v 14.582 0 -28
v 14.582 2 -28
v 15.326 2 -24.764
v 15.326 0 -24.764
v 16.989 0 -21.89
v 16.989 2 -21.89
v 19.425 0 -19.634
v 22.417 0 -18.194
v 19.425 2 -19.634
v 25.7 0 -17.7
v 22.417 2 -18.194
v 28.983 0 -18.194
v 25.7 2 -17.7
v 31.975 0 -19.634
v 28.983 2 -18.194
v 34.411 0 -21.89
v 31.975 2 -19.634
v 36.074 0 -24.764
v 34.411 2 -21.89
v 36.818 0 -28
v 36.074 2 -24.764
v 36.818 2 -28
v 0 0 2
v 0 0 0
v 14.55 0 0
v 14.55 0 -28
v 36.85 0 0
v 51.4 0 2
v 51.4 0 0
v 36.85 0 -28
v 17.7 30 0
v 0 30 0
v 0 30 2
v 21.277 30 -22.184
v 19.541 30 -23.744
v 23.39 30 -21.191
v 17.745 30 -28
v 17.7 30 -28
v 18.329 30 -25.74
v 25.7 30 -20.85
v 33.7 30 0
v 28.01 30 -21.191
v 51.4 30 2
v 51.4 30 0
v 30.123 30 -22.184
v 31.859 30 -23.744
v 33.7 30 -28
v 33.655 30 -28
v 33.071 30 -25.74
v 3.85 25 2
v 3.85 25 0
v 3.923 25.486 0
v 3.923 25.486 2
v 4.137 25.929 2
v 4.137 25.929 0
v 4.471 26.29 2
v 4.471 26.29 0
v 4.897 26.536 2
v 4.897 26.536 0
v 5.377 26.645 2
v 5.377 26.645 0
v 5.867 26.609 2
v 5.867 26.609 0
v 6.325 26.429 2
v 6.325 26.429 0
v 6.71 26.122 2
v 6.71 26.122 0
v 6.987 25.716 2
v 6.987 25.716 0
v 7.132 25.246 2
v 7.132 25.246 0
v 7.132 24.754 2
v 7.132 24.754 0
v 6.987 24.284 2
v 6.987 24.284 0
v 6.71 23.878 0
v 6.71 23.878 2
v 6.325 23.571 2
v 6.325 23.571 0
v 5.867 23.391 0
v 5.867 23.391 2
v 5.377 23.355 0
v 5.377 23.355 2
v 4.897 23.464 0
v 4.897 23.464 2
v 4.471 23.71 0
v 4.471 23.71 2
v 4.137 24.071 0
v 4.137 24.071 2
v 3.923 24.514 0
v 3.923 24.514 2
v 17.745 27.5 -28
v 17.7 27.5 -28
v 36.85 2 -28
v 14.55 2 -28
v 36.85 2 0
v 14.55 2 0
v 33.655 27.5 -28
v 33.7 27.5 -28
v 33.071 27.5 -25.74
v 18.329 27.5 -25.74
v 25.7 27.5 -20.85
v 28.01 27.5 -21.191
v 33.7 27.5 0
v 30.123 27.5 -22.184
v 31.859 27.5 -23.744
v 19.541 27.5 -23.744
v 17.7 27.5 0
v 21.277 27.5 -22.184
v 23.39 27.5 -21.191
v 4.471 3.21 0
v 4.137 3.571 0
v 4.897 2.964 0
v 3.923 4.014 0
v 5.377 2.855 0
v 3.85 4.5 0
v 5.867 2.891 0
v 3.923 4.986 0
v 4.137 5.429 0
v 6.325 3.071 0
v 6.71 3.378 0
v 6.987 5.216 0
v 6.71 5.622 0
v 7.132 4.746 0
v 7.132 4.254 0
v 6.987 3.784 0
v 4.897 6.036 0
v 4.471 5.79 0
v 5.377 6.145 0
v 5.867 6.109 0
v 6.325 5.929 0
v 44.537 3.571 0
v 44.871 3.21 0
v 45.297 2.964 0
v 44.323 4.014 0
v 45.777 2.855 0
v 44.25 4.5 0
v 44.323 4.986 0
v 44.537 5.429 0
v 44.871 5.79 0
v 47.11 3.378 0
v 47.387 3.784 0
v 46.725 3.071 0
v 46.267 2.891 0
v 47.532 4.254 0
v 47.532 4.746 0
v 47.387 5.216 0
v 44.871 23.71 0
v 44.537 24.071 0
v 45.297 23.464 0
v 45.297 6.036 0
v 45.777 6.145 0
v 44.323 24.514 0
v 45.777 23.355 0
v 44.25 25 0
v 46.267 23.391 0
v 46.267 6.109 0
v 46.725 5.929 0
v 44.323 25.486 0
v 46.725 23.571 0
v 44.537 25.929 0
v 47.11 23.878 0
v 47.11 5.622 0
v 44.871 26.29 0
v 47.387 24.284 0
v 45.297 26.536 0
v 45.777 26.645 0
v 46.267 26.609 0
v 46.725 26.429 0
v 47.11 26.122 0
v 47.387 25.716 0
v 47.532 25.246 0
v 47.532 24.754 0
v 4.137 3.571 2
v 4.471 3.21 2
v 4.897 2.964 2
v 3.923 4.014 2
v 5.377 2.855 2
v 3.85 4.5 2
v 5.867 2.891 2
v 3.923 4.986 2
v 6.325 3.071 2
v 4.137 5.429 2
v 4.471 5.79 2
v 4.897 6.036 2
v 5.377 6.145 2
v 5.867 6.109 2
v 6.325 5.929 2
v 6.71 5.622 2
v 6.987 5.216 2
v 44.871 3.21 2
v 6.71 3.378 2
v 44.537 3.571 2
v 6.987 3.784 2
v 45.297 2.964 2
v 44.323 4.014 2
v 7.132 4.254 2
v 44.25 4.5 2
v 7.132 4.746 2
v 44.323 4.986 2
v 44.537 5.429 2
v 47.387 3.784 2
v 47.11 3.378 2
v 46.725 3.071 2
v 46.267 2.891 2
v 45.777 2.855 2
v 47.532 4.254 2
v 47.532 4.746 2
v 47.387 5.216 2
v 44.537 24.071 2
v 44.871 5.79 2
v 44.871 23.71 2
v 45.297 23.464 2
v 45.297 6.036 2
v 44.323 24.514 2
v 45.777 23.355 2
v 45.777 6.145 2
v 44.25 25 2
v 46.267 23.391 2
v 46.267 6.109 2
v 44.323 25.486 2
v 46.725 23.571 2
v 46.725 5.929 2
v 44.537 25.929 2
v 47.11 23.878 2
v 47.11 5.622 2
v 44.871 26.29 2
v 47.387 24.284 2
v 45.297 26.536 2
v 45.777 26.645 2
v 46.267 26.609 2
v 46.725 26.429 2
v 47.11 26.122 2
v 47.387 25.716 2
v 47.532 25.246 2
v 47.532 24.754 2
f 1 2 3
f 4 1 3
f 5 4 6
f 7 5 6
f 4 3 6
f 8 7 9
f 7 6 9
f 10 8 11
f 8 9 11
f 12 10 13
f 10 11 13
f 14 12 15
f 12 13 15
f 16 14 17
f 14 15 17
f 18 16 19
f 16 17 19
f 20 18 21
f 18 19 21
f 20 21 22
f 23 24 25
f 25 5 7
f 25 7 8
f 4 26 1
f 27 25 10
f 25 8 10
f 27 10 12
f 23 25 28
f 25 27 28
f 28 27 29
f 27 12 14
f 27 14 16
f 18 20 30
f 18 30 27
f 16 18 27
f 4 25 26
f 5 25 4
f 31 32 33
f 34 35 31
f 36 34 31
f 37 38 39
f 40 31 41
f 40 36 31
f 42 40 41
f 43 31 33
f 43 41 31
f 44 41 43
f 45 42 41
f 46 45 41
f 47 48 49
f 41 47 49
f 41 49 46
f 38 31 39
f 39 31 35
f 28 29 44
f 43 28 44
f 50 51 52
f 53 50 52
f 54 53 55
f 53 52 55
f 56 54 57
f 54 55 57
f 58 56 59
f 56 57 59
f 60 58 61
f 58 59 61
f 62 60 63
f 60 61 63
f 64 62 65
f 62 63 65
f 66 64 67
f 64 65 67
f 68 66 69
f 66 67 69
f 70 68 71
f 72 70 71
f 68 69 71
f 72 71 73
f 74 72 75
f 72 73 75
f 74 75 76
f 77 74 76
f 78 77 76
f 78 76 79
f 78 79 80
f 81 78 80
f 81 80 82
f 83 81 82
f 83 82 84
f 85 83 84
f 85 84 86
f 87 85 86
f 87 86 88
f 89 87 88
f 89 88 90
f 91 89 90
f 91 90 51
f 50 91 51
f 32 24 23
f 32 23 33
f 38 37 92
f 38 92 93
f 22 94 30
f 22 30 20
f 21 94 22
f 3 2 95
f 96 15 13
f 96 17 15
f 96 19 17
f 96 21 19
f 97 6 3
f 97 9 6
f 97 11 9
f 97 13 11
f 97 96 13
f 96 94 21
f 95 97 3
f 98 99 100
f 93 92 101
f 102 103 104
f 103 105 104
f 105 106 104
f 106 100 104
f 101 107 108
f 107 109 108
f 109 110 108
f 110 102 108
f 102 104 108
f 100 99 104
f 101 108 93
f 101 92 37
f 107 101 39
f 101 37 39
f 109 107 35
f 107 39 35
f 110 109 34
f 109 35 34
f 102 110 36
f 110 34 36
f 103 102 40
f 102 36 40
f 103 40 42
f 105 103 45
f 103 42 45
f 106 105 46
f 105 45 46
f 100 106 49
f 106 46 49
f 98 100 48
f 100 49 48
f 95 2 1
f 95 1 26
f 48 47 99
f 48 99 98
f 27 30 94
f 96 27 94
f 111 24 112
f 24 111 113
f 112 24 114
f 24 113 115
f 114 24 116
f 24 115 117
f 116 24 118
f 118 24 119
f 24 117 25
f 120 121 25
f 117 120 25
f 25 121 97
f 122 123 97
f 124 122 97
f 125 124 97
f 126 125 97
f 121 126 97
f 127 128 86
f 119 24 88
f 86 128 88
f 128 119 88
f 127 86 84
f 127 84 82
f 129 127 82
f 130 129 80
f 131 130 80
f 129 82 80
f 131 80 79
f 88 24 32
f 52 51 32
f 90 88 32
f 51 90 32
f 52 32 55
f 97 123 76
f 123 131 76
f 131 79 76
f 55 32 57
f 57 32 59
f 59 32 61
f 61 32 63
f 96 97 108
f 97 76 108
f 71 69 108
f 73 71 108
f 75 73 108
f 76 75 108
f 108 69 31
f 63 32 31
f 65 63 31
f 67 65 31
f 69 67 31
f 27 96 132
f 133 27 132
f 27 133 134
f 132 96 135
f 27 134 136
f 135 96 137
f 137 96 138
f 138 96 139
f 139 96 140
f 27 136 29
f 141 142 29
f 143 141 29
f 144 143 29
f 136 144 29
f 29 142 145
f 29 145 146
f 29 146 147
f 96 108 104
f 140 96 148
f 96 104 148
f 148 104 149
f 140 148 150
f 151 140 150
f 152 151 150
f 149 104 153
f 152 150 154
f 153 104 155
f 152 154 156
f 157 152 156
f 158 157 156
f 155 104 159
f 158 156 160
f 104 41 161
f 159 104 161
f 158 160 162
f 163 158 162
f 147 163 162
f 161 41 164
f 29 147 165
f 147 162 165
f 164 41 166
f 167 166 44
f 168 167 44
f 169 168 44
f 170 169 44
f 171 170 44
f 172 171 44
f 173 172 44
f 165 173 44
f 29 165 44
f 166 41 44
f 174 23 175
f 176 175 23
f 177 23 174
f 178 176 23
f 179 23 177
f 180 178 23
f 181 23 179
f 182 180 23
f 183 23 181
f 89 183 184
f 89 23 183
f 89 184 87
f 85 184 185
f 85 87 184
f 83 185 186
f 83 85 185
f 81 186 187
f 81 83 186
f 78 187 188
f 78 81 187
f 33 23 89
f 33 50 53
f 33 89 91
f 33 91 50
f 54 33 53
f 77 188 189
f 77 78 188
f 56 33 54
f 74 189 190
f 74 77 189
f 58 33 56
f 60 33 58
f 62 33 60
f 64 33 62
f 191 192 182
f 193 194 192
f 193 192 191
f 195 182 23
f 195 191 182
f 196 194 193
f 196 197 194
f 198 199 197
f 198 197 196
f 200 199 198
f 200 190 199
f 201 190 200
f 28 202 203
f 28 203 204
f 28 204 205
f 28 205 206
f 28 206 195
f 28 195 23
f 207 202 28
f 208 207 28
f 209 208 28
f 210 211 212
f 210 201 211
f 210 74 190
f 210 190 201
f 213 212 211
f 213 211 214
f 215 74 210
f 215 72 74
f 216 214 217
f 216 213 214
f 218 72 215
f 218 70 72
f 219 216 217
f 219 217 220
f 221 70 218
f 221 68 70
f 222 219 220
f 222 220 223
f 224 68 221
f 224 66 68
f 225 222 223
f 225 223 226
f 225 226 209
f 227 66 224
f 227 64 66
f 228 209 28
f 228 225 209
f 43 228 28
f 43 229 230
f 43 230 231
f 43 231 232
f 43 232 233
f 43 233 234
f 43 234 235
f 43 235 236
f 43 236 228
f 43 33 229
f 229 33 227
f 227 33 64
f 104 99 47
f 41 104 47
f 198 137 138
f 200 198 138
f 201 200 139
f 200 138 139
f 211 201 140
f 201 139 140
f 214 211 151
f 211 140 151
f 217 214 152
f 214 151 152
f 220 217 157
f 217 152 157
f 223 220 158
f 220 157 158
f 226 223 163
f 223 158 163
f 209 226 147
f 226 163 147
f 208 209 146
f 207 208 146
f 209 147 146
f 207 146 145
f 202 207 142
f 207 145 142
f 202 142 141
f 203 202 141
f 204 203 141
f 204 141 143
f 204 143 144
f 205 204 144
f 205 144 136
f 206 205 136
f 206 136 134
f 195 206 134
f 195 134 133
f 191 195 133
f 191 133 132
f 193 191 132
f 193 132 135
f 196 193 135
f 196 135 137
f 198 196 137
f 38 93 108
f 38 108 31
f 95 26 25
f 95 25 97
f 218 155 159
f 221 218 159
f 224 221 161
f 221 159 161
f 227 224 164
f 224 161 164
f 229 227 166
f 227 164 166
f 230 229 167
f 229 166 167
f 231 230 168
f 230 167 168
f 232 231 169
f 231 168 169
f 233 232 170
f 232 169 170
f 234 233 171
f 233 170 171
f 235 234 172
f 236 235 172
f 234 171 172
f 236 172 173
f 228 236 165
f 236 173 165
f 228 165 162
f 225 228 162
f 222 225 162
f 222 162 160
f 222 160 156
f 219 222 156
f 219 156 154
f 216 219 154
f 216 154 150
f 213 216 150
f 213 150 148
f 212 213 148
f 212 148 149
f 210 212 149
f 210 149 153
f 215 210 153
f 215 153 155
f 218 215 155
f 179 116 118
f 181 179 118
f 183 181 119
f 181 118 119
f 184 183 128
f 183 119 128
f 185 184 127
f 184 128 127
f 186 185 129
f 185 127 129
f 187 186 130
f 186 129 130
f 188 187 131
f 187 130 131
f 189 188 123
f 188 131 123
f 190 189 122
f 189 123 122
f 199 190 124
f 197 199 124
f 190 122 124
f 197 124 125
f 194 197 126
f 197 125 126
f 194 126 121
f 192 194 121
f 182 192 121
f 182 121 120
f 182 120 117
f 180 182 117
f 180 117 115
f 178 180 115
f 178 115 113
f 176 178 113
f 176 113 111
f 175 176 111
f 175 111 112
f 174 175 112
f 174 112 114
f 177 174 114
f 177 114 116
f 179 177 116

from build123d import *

# Parameters (mm, degrees)
SKETCH1_W           = 51.4
SKETCH1_H           = 30
BOSS_EXTRUDE1_DEPTH = 2
SKETCH2_R           = 1.65
CUT_EXTRUDE1_DEPTH  = 15
SKETCH3_W           = 16
SKETCH3_H           = 2.5
SKETCH3_W_2         = 22.3
SKETCH3_H_2         = 2
BOSS_EXTRUDE2_DEPTH = 28
SKETCH4_R           = 8
CUT_EXTRUDE3_DEPTH  = 10
SKETCH6_R           = 11.15
CUT_EXTRUDE4_DEPTH  = 10


with BuildPart() as part:
    # Sketch1 → Boss-Extrude1 (new body)
    with BuildSketch(Plane.XY):
        with Locations((25.7, 15)):
            Rectangle(SKETCH1_W, SKETCH1_H)
    extrude(amount=BOSS_EXTRUDE1_DEPTH)

    # Sketch2 → Cut-Extrude1 (cut)
    with BuildSketch(Plane(origin=(0, 0, 0), x_dir=(-1, 0, 0), z_dir=(0, 0, -1))):
        with Locations((-45.9, 25)):
            Circle(SKETCH2_R)
        with Locations((-5.5, 25)):
            Circle(SKETCH2_R)
        with Locations((-5.5, 4.5)):
            Circle(SKETCH2_R)
        with Locations((-45.9, 4.5)):
            Circle(SKETCH2_R)
    extrude(amount=-CUT_EXTRUDE1_DEPTH, mode=Mode.SUBTRACT)

    # Sketch3 → Boss-Extrude2 (add)
    with BuildSketch(Plane(origin=(0, 0, 0), x_dir=(-1, 0, 0), z_dir=(0, 0, -1))):
        with Locations((-25.7, 28.75)):
            Rectangle(SKETCH3_W, SKETCH3_H)
        with Locations((-25.7, 1)):
            Rectangle(SKETCH3_W_2, SKETCH3_H_2)
    extrude(amount=BOSS_EXTRUDE2_DEPTH)

    # Sketch4 → Cut-Extrude3 (cut)
    with BuildSketch(Plane(origin=(0, 30, 0), x_dir=(1, 0, 0), z_dir=(0, 1, 0))):
        with Locations((25.7, 28.85)):
            Circle(SKETCH4_R)
    extrude(amount=-CUT_EXTRUDE3_DEPTH, mode=Mode.SUBTRACT)

    # Sketch6 → Cut-Extrude4 (cut)
    with BuildSketch(Plane(origin=(0, 2, 0), x_dir=(1, 0, 0), z_dir=(0, 1, 0))):
        with Locations((25.7, 28.85)):
            Circle(SKETCH6_R)
    extrude(amount=-CUT_EXTRUDE4_DEPTH, mode=Mode.SUBTRACT)


solid = part.part
